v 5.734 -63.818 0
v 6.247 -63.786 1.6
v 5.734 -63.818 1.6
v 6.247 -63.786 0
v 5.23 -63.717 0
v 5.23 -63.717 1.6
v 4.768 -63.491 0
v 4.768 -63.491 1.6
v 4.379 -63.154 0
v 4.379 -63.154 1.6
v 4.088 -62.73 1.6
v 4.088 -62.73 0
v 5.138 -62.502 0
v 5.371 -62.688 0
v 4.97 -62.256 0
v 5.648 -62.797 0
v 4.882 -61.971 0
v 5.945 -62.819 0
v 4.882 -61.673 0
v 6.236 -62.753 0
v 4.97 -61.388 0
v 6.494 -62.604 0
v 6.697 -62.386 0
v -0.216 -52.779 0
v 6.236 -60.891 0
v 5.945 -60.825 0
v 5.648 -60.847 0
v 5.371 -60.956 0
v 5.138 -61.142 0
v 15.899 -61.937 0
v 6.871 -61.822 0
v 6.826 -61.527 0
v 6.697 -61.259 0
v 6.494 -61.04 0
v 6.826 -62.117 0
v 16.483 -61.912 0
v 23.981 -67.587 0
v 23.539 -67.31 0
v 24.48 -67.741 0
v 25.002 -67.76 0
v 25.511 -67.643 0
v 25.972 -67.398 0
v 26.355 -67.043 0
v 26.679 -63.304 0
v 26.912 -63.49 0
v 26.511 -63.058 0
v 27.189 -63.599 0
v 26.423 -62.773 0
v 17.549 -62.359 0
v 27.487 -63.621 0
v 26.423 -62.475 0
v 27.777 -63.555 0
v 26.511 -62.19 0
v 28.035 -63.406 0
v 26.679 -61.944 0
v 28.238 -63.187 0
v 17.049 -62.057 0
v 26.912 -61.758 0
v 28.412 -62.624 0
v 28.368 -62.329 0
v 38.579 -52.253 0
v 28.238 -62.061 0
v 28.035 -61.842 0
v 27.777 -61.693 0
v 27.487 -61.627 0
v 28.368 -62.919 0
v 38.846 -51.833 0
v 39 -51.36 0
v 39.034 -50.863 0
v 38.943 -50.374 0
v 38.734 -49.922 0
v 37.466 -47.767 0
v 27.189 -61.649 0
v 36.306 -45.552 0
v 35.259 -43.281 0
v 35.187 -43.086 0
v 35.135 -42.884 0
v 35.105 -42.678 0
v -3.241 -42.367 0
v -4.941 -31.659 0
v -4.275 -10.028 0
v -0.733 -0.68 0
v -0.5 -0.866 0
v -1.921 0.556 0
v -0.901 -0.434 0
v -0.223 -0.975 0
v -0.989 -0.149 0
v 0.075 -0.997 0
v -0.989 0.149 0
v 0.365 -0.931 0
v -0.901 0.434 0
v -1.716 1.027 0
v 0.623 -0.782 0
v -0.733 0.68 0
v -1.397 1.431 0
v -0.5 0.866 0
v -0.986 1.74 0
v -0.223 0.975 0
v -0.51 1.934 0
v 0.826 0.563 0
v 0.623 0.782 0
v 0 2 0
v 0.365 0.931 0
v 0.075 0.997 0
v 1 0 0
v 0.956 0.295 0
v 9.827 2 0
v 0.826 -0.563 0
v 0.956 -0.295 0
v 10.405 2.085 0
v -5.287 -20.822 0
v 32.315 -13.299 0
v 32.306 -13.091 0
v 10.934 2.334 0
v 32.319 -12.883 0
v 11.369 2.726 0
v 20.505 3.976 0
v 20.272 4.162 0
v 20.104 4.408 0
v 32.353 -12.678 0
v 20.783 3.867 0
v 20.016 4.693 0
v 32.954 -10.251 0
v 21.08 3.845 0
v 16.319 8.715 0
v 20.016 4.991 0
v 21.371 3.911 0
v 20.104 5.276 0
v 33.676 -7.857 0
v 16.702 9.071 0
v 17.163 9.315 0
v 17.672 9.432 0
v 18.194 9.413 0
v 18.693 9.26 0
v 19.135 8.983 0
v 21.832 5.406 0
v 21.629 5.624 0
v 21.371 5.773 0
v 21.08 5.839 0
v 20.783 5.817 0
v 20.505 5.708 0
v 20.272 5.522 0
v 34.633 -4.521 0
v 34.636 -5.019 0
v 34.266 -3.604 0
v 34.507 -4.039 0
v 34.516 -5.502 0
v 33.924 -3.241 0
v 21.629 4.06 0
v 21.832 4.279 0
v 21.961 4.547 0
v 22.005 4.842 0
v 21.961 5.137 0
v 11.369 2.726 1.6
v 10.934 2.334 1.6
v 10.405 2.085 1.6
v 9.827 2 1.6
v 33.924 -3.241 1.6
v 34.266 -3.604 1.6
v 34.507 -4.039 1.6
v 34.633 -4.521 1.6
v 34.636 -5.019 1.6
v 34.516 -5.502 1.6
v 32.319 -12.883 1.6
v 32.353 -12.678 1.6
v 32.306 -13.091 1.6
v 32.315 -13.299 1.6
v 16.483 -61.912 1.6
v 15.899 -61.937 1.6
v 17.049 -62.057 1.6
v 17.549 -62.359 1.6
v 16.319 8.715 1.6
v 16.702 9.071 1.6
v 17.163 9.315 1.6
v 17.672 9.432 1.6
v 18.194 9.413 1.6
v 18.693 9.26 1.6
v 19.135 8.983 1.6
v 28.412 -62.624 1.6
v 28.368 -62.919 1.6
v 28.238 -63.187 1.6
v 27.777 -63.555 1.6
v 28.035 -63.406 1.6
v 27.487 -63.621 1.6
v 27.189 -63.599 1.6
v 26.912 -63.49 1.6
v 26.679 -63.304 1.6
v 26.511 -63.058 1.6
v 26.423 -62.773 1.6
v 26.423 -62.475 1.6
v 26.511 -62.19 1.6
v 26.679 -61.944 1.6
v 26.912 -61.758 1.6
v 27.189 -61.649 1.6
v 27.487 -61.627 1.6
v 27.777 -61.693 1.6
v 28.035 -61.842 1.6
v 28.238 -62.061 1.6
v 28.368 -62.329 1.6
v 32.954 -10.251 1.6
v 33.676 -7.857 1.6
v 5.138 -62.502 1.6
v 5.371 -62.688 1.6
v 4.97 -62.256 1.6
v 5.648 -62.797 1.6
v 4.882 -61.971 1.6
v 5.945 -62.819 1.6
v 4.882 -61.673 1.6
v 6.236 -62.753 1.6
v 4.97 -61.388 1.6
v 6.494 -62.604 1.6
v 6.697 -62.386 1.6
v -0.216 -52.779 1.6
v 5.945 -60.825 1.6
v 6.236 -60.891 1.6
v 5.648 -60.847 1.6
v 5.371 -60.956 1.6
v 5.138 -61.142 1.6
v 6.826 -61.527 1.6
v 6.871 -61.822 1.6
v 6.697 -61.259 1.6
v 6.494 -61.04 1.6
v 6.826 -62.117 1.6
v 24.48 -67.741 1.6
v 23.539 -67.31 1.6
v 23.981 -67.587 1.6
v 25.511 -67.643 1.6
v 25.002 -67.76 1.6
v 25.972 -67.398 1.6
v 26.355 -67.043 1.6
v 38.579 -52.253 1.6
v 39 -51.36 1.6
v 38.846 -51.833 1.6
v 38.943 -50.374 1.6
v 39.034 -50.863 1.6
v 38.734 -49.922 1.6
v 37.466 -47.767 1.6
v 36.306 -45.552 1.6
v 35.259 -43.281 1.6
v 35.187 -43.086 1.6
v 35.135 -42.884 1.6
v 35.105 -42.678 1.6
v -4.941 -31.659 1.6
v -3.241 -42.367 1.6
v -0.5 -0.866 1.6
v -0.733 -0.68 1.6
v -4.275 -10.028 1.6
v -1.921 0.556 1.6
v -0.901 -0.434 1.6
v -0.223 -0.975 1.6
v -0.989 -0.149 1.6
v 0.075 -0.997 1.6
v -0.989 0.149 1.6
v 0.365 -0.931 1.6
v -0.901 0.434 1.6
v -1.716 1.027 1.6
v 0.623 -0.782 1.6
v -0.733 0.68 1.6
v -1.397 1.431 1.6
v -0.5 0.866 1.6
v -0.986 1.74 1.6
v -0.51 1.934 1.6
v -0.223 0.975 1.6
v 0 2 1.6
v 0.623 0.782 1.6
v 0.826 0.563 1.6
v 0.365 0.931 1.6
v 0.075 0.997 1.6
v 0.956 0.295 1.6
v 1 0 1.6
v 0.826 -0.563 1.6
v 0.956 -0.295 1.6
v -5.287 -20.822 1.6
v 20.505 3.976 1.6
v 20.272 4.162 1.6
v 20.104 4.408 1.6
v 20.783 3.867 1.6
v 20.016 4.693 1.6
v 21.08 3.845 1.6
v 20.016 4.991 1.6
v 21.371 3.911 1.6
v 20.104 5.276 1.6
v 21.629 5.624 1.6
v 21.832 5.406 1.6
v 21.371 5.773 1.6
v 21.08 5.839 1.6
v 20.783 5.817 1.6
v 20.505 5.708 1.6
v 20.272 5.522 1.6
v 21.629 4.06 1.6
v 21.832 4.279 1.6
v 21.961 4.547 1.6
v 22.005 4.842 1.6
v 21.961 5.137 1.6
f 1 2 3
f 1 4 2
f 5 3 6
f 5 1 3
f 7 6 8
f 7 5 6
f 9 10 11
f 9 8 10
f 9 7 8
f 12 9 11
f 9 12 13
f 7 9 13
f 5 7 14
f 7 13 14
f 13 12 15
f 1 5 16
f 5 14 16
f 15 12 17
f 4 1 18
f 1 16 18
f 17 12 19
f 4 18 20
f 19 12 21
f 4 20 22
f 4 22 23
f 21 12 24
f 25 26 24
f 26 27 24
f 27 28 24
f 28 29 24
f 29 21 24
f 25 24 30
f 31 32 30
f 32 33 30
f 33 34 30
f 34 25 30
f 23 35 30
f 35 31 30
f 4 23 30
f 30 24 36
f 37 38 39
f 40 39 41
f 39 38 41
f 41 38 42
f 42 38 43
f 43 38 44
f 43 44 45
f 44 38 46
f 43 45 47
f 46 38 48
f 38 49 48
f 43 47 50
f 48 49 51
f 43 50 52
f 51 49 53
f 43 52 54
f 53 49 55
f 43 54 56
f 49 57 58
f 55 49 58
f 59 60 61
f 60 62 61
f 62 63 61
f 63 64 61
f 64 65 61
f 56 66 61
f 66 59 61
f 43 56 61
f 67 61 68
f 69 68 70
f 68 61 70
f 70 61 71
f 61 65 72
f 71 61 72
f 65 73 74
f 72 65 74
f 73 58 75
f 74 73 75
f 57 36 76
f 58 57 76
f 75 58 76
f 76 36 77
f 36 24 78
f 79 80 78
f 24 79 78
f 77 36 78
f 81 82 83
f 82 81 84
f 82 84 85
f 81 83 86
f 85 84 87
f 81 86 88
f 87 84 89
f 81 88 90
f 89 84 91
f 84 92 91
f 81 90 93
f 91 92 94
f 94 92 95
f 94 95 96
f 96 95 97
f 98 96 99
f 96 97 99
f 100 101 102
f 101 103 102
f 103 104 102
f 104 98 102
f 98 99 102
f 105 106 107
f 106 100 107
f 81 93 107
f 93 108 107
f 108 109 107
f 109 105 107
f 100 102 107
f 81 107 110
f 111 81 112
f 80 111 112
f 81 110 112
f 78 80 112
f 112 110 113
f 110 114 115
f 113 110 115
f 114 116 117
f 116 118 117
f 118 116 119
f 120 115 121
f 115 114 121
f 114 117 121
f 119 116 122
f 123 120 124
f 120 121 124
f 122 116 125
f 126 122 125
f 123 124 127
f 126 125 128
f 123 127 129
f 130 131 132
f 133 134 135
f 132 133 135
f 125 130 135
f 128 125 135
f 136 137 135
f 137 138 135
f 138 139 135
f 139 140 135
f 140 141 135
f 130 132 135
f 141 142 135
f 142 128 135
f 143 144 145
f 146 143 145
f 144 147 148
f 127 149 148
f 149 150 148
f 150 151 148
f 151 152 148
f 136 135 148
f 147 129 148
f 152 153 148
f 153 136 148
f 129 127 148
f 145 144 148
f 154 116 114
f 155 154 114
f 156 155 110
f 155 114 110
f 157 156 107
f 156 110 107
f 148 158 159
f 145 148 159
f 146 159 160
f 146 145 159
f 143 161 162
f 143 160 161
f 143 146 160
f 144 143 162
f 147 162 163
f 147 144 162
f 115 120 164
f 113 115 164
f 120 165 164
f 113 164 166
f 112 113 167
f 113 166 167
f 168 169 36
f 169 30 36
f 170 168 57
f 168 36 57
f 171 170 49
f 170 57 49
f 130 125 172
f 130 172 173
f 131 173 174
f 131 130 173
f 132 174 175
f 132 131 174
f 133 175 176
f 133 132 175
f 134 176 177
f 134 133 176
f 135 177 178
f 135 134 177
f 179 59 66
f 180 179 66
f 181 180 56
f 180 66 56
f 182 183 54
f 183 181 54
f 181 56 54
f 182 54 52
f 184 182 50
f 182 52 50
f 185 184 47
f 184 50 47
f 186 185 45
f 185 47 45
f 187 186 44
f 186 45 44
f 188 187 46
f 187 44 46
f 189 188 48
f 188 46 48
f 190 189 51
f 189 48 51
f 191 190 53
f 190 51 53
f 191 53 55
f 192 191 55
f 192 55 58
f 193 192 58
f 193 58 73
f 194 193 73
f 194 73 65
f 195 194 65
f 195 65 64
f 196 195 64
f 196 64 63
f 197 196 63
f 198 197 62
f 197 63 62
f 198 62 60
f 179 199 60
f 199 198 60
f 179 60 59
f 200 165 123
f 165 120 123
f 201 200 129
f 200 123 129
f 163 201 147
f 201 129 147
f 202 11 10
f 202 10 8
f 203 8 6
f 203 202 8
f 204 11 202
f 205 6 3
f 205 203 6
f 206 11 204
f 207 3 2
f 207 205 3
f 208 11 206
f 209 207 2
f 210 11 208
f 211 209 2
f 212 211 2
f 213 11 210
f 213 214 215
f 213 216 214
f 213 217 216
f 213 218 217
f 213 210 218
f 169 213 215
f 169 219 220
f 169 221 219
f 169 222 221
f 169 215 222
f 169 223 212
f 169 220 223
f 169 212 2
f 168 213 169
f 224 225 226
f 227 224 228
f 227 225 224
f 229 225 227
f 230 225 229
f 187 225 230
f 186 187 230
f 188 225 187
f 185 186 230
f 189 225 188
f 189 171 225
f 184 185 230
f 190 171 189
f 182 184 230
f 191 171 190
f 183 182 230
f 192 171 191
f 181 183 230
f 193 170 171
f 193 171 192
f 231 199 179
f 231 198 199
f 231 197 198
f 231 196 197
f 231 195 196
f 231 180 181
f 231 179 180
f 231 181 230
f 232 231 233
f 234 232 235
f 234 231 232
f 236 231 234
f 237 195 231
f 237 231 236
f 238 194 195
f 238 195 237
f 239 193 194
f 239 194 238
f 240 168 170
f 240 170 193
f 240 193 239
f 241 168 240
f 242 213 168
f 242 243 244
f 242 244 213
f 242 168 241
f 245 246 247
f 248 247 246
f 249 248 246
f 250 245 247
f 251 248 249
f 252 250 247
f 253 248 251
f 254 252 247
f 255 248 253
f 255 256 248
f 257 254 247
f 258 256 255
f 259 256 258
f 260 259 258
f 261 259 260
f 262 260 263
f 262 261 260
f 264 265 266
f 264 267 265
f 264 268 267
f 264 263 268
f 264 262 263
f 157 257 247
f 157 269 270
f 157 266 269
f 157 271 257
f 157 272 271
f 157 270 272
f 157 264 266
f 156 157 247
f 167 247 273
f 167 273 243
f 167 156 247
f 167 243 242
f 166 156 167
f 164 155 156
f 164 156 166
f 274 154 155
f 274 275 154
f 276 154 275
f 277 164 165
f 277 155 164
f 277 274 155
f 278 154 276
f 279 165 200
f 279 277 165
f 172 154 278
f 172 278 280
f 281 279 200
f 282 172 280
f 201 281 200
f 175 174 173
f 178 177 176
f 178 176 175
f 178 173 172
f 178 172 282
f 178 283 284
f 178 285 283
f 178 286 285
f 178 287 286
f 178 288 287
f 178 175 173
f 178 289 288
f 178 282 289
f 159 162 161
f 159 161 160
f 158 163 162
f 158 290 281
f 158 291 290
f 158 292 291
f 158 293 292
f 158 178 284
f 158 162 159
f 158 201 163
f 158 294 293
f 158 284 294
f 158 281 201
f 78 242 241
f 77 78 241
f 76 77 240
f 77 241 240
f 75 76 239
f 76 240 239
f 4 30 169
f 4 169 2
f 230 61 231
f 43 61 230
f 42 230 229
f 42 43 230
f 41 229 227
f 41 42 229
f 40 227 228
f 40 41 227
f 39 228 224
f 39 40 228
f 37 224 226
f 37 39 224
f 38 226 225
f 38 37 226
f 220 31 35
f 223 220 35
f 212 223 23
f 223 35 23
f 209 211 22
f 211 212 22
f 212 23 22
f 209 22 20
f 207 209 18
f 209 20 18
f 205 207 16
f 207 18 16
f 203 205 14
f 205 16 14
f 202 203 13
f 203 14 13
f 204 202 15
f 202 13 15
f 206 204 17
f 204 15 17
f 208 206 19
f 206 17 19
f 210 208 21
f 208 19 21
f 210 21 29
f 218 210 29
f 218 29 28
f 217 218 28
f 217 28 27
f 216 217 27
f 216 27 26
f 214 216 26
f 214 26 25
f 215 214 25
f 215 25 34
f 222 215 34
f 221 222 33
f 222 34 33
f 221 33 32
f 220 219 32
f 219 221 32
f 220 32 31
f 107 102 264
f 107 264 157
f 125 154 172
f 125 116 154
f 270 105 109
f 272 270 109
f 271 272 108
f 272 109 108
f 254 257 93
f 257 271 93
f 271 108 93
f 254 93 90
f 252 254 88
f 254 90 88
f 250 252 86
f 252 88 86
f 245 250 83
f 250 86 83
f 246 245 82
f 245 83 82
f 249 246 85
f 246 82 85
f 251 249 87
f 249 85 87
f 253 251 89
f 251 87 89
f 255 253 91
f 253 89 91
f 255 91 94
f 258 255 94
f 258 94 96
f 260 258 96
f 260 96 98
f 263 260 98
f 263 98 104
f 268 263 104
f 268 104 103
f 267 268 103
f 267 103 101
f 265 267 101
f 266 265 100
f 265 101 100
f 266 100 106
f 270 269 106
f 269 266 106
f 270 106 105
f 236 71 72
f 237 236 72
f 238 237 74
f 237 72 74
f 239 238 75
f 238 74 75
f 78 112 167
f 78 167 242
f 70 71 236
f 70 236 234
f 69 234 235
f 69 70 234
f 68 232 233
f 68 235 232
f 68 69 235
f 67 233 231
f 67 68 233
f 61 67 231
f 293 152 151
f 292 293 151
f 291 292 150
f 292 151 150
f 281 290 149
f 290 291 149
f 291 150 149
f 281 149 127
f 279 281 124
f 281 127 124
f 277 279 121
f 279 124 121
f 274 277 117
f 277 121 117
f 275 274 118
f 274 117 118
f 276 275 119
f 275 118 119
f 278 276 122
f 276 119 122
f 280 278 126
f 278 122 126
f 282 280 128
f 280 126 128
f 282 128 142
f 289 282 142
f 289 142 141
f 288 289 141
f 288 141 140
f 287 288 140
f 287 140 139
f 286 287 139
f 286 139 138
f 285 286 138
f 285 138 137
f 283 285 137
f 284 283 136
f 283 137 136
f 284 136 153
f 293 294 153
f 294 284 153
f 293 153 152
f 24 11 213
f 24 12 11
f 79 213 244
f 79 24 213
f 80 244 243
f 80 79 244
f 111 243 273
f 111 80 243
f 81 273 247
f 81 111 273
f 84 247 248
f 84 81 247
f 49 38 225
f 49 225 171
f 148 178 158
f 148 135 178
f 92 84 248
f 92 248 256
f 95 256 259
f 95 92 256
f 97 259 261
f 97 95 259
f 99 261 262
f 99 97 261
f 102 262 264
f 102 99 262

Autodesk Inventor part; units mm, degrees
ref_plane "YZ Plane" through (0, 0, 0) normal (1, 0, 0) x (0, 1, 0)
ref_plane "XZ Plane" through (0, 0, 0) normal (0, 1, 0) x (-1, 0, 0)
ref_plane "XY Plane" through (0, 0, 0) normal (0, 0, 1) x (1, 0, 0)
sketch "スケッチ1" plane through (0, 0, 0) normal (0, 0, 1) x (1, 0, 0)
  circle A0 centre (21.005288, 4.842186) radius 2
  circle A1 centre (0, 0) radius 2
  circle A2 centre (81.171801, -23.481667) radius 63
  arc A3 (-1.921226, 0.555779) -> (4.088443, -62.729672) centre (81.171801, -23.481667) ccw
  line L0 (0, 2) -> (9.827028, 2)
  line L1 (11.368602, 2.725814) -> (16.319283, 8.715397)
  line L2 (19.135043, 8.982785) -> (33.924305, -3.241258)
  line L3 (8.206239, 4.393532) -> (1.777293, 9.707368)
  line L4 (40.328272, 40.117124) -> (11.021999, 4.660921)
  arc A4 (9.827028, 2) -> (11.368602, 2.725814) centre (9.827028, 4) ccw
  arc A5 (19.135043, 8.982785) -> (16.319283, 8.715397) centre (17.860857, 7.441211) ccw
  arc A6 (34.516338, -5.502018) -> (38.734488, -49.921682) centre (81.171801, -23.481667) ccw
  circle A7 centre (5.870717, -61.822204) radius 2
  circle A8 centre (27.411976, -62.624114) radius 2
  line L5 (81.171801, -23.481667) -> (18.171801, -23.481667) construction
  line L6 (38.578569, -52.253469) -> (26.354526, -67.042731)
  line L7 (17.573011, -64.325196) -> (53.029214, -93.631469)
  line L8 (17.573011, -64.325196) -> (53.029214, -93.631469)
  line L9 (9.443415, -71.02153) -> (14.757251, -64.592584)
  line L10 (23.538766, -67.310119) -> (17.549183, -62.359438)
  arc A9 (23.538766, -67.310119) -> (26.354526, -67.042731) centre (24.812952, -65.768545) ccw
  line L11 (15.898547, -61.93676) -> (6.247168, -63.786456)
  arc A10 (17.549183, -62.359438) -> (15.898547, -61.93676) centre (16.274997, -63.901012) ccw
  arc A11 (34.516338, -5.502018) -> (33.924305, -3.241258) centre (32.65012, -4.782832) ccw
  arc A12 (38.578569, -52.253469) -> (38.734488, -49.921682) centre (37.036995, -50.979283) ccw
  circle A13 centre (5.870717, -61.822204) radius 1
  circle A14 centre (27.411976, -62.624114) radius 1
  circle A15 centre (21.005288, 4.842186) radius 1
  circle A16 centre (0, 0) radius 1
  line L12 (0, 0) -> (5.870717, -61.822204) construction
  line L13 (32.285214, -12.988736) -> (35.134053, -42.988736)
  point P0 (0, 0)
  point P1 (35.050768, -4.172335)
  point P2 (39.509645, -51.127006)
  dimension "d0" = 1.5
  dimension "d1" = 2
  dimension "d3" = 50
  dimension "d8" = 2
  dimension "d9" = 2
  dimension "d12" = 30
extrude "押し出し1" add sketch "スケッチ1" along normal blind 1.6 contours A0 | A8 | L2 A2 L6 A9 L10 A10 L11 A7 A3 A1 L0 A4 L1 A5 | L2 A11 A6 A12 L6 A2 | L13 A6 | A1 | A7
fillet "フィレット1" radius 2 2 edges at (35.1341, -42.9887, 0.8) (32.2852, -12.9887, 0.8)
properties part number "MainMCU_PCB"
